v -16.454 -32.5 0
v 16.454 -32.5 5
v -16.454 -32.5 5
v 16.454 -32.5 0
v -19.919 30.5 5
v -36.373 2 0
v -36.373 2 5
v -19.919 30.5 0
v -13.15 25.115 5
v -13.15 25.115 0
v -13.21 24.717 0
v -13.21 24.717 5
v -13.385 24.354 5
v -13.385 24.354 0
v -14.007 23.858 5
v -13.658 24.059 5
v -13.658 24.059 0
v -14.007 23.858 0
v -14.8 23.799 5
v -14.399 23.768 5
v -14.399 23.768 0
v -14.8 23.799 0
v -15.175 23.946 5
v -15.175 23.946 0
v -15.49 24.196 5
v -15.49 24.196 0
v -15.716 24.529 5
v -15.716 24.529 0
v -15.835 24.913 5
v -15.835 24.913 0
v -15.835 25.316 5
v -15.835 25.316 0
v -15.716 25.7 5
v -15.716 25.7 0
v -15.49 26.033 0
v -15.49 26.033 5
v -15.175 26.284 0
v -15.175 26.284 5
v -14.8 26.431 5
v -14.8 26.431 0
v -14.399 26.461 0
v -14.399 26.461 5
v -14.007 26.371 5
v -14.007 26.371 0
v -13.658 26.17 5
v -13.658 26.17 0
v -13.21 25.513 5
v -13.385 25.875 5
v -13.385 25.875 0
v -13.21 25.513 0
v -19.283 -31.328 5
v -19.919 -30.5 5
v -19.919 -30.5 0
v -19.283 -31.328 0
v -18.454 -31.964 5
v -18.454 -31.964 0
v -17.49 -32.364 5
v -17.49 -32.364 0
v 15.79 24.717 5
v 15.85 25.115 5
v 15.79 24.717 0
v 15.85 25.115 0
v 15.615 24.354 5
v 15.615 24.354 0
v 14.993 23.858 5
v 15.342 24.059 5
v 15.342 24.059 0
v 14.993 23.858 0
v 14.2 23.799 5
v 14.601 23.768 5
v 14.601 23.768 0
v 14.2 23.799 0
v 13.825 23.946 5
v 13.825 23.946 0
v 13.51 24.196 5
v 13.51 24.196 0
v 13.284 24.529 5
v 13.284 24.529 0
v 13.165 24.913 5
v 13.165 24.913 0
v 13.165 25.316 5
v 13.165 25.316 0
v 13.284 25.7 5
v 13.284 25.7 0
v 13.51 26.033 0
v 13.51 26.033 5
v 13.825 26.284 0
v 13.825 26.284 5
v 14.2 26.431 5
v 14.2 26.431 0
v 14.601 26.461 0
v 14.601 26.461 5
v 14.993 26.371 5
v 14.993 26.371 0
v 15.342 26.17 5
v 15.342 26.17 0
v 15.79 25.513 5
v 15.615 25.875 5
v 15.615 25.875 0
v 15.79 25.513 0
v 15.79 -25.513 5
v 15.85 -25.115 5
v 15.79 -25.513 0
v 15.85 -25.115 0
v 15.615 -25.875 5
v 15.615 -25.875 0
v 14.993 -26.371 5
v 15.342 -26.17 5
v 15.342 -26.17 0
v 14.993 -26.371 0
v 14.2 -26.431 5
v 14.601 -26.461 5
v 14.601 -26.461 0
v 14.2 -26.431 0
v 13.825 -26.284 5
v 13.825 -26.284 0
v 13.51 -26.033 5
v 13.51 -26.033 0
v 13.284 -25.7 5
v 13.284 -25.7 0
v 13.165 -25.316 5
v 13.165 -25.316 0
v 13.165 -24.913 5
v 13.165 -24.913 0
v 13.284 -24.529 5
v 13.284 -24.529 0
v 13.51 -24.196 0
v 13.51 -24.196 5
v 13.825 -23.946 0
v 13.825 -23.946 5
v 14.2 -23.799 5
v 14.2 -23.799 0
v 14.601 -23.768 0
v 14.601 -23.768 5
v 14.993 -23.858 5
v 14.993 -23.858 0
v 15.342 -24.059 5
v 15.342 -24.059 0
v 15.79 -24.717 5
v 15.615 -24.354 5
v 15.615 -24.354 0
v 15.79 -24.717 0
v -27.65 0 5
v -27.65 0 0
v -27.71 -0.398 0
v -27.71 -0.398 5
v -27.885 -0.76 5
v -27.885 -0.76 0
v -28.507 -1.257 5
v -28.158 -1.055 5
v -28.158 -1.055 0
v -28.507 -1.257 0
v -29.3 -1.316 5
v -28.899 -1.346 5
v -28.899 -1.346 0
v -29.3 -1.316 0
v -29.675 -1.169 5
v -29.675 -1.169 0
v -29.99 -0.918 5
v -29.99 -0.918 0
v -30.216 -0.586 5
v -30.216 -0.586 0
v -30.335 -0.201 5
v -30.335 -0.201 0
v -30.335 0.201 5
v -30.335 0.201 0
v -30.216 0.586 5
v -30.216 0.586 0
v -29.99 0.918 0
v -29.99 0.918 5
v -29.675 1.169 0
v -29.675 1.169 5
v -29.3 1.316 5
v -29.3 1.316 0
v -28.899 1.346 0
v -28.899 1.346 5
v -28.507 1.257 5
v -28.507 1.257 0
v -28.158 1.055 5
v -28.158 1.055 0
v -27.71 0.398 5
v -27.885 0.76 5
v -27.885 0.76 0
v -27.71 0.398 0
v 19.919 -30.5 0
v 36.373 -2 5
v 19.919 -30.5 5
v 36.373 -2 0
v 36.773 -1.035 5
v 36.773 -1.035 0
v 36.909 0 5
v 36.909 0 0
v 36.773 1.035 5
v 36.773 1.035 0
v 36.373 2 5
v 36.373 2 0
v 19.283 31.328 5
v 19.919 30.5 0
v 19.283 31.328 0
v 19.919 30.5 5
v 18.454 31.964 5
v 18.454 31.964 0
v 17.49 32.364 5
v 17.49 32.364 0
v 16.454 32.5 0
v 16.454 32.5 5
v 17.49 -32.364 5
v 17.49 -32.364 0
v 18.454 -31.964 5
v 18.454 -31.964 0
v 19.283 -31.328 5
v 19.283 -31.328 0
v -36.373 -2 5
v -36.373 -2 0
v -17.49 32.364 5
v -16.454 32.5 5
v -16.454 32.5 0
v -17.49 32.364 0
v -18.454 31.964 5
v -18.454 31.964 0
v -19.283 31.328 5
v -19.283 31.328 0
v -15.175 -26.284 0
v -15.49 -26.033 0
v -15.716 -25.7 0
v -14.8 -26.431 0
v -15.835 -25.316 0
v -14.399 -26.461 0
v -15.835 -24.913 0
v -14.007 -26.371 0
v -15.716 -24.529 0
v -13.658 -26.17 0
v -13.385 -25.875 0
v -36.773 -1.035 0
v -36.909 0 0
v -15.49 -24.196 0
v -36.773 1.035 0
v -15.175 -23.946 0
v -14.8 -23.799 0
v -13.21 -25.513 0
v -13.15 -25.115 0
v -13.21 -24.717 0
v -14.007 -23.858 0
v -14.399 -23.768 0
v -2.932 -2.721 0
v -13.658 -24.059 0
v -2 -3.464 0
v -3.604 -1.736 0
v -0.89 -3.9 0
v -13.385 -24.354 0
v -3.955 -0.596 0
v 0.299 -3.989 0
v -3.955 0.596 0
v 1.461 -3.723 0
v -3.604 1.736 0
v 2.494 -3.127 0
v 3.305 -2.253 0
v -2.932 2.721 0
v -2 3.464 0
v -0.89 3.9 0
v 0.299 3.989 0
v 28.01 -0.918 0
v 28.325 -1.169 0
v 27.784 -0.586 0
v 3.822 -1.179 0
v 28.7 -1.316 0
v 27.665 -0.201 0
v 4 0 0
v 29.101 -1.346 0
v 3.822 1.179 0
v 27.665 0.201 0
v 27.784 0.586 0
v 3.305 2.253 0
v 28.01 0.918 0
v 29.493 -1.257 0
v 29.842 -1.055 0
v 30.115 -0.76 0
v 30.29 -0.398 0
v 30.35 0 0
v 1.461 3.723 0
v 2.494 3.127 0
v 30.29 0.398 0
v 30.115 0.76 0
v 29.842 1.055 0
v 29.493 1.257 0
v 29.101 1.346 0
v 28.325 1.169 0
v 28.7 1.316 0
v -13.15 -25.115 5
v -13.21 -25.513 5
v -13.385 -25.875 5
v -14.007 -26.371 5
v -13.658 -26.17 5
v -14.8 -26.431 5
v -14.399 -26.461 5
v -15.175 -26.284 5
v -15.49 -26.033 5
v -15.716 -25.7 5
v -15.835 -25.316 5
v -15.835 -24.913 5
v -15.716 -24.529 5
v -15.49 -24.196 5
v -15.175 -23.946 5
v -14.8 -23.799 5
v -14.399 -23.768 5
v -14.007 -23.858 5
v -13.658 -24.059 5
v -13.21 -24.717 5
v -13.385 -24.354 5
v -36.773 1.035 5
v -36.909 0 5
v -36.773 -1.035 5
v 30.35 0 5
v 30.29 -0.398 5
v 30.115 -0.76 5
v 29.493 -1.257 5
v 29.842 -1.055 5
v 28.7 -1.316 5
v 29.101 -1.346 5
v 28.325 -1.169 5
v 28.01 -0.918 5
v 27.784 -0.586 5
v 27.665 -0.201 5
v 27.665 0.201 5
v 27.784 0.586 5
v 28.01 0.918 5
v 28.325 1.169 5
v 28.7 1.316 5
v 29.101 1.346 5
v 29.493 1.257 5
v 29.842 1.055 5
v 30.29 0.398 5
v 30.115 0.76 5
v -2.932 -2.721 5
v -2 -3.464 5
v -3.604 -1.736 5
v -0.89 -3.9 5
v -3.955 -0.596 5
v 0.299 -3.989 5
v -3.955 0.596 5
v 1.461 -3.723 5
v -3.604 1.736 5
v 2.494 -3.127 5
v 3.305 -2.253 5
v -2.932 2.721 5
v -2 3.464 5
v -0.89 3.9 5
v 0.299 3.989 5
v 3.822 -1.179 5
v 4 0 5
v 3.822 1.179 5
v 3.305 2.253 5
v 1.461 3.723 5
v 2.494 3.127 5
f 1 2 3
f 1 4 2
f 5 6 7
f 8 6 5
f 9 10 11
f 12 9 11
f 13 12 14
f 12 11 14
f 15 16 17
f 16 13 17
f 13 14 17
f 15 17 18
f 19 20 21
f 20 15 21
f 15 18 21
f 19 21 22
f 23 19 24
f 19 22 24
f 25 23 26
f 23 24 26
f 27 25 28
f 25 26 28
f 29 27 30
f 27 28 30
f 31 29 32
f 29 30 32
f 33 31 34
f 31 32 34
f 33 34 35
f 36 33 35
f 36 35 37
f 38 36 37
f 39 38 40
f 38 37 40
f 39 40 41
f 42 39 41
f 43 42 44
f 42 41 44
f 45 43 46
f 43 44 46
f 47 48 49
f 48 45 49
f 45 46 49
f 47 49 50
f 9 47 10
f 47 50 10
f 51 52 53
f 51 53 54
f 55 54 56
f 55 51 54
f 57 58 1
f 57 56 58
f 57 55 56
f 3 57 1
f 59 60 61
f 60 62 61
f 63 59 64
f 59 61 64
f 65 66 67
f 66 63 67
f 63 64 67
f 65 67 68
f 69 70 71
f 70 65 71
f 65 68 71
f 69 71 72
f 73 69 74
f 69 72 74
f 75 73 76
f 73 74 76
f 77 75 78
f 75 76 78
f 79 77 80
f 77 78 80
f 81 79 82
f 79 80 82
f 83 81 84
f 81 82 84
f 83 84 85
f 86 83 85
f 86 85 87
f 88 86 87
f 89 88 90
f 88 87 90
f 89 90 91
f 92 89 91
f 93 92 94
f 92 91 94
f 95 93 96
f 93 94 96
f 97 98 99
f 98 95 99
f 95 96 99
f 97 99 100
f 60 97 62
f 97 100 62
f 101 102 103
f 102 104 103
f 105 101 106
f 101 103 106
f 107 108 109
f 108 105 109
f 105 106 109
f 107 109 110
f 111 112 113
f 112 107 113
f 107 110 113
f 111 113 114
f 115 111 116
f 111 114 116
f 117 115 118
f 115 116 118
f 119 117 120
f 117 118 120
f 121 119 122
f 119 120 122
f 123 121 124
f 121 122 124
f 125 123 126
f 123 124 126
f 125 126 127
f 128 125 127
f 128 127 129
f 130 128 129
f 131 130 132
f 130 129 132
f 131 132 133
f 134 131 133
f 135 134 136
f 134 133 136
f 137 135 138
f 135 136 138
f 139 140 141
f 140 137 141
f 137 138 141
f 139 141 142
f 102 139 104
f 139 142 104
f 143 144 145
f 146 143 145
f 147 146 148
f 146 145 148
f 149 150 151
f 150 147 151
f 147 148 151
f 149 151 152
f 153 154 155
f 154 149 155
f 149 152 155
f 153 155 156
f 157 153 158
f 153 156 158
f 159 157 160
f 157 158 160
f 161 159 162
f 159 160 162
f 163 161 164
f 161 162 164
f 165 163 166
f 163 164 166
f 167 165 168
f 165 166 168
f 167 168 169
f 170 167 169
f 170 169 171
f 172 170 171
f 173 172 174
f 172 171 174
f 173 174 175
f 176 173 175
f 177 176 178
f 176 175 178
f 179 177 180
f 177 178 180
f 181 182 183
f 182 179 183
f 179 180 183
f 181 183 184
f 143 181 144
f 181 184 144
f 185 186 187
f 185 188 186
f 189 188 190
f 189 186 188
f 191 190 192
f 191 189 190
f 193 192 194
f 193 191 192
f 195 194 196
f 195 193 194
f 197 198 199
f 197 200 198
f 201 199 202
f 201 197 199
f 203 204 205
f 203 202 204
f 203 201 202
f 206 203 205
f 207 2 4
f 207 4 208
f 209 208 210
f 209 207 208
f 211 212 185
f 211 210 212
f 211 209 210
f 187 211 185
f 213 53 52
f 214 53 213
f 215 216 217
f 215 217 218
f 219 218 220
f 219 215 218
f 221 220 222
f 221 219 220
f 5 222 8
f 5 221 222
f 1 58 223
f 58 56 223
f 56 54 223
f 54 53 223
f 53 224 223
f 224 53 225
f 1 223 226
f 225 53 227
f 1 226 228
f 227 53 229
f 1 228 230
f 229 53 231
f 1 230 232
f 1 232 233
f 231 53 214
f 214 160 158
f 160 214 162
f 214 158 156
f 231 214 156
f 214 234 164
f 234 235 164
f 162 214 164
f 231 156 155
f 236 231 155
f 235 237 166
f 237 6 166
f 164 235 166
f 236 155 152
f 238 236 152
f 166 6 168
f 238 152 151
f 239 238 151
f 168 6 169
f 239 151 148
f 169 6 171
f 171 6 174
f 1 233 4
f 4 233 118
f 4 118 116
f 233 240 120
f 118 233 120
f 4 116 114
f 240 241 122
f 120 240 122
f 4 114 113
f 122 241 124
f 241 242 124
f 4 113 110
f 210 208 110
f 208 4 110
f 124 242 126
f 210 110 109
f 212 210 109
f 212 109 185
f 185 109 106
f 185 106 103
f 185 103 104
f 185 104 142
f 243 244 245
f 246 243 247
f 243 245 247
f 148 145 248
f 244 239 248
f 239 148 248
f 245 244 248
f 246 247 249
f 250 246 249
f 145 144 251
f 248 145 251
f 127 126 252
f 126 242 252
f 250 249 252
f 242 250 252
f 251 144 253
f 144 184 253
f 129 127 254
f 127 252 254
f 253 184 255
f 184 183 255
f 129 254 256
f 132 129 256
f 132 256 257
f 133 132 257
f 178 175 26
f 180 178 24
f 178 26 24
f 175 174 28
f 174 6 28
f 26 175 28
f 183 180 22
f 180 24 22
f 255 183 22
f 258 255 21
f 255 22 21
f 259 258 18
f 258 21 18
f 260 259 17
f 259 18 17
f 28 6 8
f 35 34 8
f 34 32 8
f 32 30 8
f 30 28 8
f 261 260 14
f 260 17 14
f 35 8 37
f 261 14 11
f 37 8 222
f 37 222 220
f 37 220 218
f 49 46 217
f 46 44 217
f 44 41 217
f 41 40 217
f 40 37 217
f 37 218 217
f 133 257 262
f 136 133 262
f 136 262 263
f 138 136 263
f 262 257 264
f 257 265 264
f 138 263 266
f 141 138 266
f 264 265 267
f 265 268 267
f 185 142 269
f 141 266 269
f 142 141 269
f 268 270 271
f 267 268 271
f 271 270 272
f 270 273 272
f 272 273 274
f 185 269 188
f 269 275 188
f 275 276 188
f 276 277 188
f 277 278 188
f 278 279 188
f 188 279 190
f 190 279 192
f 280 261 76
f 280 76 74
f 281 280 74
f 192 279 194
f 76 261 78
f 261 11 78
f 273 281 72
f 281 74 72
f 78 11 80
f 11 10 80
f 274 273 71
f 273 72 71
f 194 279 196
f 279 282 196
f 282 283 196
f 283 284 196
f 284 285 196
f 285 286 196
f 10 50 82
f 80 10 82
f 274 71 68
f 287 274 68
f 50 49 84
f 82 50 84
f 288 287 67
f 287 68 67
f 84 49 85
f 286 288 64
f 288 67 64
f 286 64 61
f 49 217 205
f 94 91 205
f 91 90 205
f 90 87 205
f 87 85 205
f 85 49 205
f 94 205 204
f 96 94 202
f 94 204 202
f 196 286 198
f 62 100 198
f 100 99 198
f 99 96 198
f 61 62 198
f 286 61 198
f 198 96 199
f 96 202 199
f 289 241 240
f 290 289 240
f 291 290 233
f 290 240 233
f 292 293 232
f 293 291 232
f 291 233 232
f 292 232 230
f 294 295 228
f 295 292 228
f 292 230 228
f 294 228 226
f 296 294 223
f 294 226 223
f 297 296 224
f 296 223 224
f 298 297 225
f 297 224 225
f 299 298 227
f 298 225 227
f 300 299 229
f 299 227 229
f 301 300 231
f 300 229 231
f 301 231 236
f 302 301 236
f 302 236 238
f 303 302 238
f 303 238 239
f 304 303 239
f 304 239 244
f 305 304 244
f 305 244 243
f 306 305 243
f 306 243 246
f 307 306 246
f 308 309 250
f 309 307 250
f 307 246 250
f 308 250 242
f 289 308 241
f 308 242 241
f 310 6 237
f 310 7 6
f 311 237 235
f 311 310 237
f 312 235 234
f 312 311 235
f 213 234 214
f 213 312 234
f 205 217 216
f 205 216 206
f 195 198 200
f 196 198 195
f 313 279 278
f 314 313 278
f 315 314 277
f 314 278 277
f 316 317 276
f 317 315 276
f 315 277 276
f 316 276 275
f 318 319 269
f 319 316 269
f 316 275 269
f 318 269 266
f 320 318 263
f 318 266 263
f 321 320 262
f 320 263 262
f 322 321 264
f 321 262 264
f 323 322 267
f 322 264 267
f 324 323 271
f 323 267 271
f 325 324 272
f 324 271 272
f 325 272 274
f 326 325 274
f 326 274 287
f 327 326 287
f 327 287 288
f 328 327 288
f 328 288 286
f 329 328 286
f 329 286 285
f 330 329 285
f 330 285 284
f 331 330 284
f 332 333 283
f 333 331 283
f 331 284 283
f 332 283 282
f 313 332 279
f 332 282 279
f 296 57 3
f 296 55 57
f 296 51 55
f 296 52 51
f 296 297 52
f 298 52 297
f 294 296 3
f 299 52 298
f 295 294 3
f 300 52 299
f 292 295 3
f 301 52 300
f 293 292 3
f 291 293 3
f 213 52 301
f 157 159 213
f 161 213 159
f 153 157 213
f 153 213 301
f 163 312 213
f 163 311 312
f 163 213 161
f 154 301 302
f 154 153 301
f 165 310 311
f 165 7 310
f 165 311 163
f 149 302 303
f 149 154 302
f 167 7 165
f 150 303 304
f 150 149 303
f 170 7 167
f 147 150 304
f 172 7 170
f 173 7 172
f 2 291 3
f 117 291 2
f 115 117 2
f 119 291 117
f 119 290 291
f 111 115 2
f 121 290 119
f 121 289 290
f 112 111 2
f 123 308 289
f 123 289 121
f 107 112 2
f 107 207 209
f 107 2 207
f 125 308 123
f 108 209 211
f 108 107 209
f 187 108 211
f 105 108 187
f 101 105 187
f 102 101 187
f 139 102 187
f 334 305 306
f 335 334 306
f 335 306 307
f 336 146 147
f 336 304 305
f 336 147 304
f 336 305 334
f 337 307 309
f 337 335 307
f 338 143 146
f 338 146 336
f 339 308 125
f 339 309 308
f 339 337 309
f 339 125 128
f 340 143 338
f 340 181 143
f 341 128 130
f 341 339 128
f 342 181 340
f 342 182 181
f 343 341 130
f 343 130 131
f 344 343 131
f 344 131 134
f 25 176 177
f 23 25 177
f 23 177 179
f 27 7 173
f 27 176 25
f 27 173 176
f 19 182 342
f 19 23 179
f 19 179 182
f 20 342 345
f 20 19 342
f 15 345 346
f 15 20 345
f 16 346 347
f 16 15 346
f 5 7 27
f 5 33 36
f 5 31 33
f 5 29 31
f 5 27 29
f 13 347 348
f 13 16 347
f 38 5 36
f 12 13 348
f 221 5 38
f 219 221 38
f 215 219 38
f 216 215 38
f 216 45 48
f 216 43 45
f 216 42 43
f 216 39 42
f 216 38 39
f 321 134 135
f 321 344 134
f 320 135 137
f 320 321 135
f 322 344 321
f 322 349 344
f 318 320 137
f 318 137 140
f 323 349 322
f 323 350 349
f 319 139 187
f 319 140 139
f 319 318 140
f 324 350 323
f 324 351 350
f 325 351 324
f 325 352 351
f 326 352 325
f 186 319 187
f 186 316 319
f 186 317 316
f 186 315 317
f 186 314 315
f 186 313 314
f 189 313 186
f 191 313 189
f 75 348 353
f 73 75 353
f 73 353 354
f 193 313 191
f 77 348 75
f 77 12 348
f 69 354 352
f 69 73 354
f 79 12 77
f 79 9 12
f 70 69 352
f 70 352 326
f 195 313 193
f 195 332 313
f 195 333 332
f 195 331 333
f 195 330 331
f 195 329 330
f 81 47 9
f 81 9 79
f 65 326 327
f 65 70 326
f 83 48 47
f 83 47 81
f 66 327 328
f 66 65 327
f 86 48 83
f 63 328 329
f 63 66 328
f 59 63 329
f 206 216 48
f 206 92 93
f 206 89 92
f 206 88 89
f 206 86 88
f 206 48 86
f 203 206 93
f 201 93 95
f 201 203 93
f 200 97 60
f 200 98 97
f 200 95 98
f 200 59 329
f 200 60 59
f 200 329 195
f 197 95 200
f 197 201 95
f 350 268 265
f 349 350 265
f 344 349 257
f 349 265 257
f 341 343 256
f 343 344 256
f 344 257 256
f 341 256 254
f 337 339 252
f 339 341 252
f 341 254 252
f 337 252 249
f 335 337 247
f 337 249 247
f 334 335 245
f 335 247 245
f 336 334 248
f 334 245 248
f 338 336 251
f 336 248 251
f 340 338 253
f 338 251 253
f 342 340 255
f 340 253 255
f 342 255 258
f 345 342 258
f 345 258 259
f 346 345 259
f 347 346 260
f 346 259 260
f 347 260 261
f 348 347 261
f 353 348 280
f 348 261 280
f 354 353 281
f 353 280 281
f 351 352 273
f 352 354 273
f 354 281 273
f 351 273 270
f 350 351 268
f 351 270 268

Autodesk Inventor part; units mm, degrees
ref_plane "YZ Plane" through (0, 0, 0) normal (1, 0, 0) x (0, 1, 0)
ref_plane "XZ Plane" through (0, 0, 0) normal (0, 1, 0) x (-1, 0, 0)
ref_plane "XY Plane" through (0, 0, 0) normal (0, 0, 1) x (1, 0, 0)
sketch "Sketch1" plane through (0, 0, 0) normal (0, 0, 1) x (1, 0, 0)
  line L0 (-14.5, 25.1147) -> (14.5, 25.1147) construction
  line L1 (14.5, 25.1147) -> (29, 0) construction
  line L2 (29, 0) -> (14.5, -25.1147) construction
  line L3 (14.5, -25.1147) -> (-14.5, -25.1147) construction
  line L4 (-14.5, -25.1147) -> (-29, 0) construction
  line L5 (-29, 0) -> (-14.5, 25.1147) construction
  line L6 (-18.7639, 32.5) -> (18.7639, 32.5)
  line L7 (18.7639, 32.5) -> (37.5278, 0)
  line L8 (37.5278, 0) -> (18.7639, -32.5)
  line L9 (18.7639, -32.5) -> (-18.7639, -32.5)
  line L10 (-18.7639, -32.5) -> (-37.5278, 0)
  line L11 (-37.5278, 0) -> (-18.7639, 32.5)
  circle A0 centre (-14.5, 25.1147) radius 11 construction
  circle A1 centre (14.5, 25.1147) radius 11 construction
  circle A2 centre (29, 0) radius 11 construction
  circle A3 centre (14.5, -25.1147) radius 11 construction
  circle A4 centre (-14.5, -25.1147) radius 11 construction
  circle A5 centre (-29, 0) radius 11 construction
  circle A6 centre (-14.5, 25.1147) radius 1.35
  circle A7 centre (14.5, 25.1147) radius 1.35
  circle A8 centre (29, 0) radius 1.35
  circle A9 centre (14.5, -25.1147) radius 1.35
  circle A10 centre (-14.5, -25.1147) radius 1.35
  circle A11 centre (-29, 0) radius 1.35
  circle A12 centre (0, 0) radius 4
  circle A13 centre (0, 0) radius 40 construction
  dimension "d0" = 22
  dimension "d1" = 50.2295
  dimension "d2" = 2.7
  dimension "d3" = 65
  dimension "d4" = 8
  dimension "d8" = 80
extrude "Extrusion1" add sketch "Sketch1" along normal blind 5
fillet "Fillet1" radius 4 6 edges at (37.5278, 0, 2.5) (18.7639, -32.5, 2.5) (-18.7639, -32.5, 2.5) (-37.5278, 0, 2.5) (-18.7639, 32.5, 2.5) (18.7639, 32.5, 2.5)
properties part number "rotor 1"
